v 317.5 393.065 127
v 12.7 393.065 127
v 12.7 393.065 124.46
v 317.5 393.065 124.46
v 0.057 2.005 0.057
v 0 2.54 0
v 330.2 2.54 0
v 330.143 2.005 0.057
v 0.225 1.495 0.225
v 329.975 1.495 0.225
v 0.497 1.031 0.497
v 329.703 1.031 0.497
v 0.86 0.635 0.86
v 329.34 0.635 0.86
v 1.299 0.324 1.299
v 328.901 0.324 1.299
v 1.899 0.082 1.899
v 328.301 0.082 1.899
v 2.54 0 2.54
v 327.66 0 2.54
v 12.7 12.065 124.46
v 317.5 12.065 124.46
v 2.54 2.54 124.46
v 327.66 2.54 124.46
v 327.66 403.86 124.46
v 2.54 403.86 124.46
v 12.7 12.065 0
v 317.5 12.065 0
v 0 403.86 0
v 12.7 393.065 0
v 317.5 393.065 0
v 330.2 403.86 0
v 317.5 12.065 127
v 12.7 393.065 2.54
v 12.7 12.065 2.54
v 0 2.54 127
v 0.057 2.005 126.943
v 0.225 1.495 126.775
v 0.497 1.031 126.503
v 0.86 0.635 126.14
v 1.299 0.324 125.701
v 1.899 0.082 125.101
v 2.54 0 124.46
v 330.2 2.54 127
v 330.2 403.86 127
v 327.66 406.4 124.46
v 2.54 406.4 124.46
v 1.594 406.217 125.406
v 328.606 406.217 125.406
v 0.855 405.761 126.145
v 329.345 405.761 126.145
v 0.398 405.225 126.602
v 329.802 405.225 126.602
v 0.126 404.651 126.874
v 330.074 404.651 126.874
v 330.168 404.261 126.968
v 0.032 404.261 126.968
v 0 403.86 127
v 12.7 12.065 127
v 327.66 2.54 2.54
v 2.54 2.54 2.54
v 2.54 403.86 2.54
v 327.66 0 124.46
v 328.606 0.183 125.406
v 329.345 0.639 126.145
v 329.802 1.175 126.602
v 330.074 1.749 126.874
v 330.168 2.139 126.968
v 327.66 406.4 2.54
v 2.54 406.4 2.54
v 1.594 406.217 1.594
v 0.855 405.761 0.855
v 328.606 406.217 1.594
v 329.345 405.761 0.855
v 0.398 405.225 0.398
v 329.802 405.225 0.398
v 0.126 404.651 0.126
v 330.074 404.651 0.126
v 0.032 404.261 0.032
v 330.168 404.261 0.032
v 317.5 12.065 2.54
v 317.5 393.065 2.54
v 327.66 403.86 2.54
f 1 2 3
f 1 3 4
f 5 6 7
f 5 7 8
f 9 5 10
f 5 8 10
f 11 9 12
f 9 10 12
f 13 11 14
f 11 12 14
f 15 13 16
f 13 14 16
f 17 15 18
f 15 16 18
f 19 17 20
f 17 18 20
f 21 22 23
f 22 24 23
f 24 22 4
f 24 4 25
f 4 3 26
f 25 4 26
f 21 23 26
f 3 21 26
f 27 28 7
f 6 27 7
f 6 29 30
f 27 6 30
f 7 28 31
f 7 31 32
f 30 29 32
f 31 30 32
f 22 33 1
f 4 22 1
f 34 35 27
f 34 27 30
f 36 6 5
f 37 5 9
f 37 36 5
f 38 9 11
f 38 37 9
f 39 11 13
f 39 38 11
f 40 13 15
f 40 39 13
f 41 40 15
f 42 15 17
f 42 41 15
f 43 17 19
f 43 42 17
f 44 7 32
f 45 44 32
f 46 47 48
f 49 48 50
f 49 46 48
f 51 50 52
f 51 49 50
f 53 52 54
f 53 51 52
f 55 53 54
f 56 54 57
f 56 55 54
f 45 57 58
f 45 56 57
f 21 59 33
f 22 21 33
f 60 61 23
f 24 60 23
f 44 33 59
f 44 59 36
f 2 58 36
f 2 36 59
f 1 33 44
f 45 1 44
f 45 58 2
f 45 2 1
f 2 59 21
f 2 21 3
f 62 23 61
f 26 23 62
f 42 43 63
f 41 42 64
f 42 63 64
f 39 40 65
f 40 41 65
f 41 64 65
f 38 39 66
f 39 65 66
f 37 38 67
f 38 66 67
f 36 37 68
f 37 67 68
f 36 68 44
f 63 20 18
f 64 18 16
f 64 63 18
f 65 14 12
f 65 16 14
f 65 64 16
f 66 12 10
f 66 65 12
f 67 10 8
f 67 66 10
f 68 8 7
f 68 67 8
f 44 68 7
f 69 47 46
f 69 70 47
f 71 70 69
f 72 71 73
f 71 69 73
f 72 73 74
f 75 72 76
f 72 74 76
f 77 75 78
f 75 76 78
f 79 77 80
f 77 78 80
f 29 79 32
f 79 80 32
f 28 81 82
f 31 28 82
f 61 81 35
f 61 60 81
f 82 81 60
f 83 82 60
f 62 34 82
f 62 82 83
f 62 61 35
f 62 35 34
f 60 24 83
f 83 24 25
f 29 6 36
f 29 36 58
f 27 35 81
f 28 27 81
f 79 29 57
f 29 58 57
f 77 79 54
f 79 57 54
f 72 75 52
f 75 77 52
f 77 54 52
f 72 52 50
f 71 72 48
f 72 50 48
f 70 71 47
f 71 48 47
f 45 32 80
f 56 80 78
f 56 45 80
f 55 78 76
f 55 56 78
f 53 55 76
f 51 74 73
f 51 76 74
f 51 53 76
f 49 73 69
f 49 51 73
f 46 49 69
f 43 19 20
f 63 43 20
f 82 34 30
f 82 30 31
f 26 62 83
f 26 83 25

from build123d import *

# Parameters (mm, degrees)
SKETCH2_W           = 330.2
SKETCH2_H           = 406.4
BOSS_EXTRUDE1_DEPTH = 127
FILLET1_R           = 2.54
FILLET2_R           = 2.54
SKETCH3_W           = 304.8
SKETCH3_H           = 381
CUT_EXTRUDE1_DEPTH  = 127
SHELL4_START        = 2.54
SHELL4_OUTLINE_W    = 401.32
SHELL4_OUTLINE_H    = 121.92
SHELL4_DEPTH        = 325.12


# Read off the part's stored shape, not the designer's step: Shell4
with BuildPart() as part:
    # Sketch2 → Boss-Extrude1 (new body)
    with BuildSketch(Plane.XY):
        with Locations((165.1, 203.2)):
            Rectangle(SKETCH2_W, SKETCH2_H)
    extrude(amount=BOSS_EXTRUDE1_DEPTH)

    # Fillet1
    fillet1_edges = [part.edges().sort_by_distance(p)[0] for p in [
        (165.1, 406.4, 127),
        (165.1, 406.4, 0),
        (0, 406.4, 63.5),
        (330.2, 406.4, 63.5),
    ]]
    fillet(fillet1_edges, radius=FILLET1_R)

    # Fillet2
    fillet2_edges = [part.edges().sort_by_distance(p)[0] for p in [
        (165.1, 0, 0),
        (330.2, 0, 63.5),
        (0, 0, 63.5),
        (165.1, 0, 127),
    ]]
    fillet(fillet2_edges, radius=FILLET2_R)

    # Sketch3 → Cut-Extrude1 (cut)
    with BuildSketch(Plane.XY.offset(127)):
        with Locations((165.1, 202.565)):
            Rectangle(SKETCH3_W, SKETCH3_H)
    extrude(amount=-CUT_EXTRUDE1_DEPTH, mode=Mode.SUBTRACT)

    # Shell4 outline → Shell4 (cut)
    with BuildSketch(Plane.YZ.offset(SHELL4_START)):
        with Locations((203.2, 63.5)):
            Rectangle(SHELL4_OUTLINE_W, SHELL4_OUTLINE_H)
    extrude(amount=SHELL4_DEPTH, mode=Mode.SUBTRACT)


solid = part.part
